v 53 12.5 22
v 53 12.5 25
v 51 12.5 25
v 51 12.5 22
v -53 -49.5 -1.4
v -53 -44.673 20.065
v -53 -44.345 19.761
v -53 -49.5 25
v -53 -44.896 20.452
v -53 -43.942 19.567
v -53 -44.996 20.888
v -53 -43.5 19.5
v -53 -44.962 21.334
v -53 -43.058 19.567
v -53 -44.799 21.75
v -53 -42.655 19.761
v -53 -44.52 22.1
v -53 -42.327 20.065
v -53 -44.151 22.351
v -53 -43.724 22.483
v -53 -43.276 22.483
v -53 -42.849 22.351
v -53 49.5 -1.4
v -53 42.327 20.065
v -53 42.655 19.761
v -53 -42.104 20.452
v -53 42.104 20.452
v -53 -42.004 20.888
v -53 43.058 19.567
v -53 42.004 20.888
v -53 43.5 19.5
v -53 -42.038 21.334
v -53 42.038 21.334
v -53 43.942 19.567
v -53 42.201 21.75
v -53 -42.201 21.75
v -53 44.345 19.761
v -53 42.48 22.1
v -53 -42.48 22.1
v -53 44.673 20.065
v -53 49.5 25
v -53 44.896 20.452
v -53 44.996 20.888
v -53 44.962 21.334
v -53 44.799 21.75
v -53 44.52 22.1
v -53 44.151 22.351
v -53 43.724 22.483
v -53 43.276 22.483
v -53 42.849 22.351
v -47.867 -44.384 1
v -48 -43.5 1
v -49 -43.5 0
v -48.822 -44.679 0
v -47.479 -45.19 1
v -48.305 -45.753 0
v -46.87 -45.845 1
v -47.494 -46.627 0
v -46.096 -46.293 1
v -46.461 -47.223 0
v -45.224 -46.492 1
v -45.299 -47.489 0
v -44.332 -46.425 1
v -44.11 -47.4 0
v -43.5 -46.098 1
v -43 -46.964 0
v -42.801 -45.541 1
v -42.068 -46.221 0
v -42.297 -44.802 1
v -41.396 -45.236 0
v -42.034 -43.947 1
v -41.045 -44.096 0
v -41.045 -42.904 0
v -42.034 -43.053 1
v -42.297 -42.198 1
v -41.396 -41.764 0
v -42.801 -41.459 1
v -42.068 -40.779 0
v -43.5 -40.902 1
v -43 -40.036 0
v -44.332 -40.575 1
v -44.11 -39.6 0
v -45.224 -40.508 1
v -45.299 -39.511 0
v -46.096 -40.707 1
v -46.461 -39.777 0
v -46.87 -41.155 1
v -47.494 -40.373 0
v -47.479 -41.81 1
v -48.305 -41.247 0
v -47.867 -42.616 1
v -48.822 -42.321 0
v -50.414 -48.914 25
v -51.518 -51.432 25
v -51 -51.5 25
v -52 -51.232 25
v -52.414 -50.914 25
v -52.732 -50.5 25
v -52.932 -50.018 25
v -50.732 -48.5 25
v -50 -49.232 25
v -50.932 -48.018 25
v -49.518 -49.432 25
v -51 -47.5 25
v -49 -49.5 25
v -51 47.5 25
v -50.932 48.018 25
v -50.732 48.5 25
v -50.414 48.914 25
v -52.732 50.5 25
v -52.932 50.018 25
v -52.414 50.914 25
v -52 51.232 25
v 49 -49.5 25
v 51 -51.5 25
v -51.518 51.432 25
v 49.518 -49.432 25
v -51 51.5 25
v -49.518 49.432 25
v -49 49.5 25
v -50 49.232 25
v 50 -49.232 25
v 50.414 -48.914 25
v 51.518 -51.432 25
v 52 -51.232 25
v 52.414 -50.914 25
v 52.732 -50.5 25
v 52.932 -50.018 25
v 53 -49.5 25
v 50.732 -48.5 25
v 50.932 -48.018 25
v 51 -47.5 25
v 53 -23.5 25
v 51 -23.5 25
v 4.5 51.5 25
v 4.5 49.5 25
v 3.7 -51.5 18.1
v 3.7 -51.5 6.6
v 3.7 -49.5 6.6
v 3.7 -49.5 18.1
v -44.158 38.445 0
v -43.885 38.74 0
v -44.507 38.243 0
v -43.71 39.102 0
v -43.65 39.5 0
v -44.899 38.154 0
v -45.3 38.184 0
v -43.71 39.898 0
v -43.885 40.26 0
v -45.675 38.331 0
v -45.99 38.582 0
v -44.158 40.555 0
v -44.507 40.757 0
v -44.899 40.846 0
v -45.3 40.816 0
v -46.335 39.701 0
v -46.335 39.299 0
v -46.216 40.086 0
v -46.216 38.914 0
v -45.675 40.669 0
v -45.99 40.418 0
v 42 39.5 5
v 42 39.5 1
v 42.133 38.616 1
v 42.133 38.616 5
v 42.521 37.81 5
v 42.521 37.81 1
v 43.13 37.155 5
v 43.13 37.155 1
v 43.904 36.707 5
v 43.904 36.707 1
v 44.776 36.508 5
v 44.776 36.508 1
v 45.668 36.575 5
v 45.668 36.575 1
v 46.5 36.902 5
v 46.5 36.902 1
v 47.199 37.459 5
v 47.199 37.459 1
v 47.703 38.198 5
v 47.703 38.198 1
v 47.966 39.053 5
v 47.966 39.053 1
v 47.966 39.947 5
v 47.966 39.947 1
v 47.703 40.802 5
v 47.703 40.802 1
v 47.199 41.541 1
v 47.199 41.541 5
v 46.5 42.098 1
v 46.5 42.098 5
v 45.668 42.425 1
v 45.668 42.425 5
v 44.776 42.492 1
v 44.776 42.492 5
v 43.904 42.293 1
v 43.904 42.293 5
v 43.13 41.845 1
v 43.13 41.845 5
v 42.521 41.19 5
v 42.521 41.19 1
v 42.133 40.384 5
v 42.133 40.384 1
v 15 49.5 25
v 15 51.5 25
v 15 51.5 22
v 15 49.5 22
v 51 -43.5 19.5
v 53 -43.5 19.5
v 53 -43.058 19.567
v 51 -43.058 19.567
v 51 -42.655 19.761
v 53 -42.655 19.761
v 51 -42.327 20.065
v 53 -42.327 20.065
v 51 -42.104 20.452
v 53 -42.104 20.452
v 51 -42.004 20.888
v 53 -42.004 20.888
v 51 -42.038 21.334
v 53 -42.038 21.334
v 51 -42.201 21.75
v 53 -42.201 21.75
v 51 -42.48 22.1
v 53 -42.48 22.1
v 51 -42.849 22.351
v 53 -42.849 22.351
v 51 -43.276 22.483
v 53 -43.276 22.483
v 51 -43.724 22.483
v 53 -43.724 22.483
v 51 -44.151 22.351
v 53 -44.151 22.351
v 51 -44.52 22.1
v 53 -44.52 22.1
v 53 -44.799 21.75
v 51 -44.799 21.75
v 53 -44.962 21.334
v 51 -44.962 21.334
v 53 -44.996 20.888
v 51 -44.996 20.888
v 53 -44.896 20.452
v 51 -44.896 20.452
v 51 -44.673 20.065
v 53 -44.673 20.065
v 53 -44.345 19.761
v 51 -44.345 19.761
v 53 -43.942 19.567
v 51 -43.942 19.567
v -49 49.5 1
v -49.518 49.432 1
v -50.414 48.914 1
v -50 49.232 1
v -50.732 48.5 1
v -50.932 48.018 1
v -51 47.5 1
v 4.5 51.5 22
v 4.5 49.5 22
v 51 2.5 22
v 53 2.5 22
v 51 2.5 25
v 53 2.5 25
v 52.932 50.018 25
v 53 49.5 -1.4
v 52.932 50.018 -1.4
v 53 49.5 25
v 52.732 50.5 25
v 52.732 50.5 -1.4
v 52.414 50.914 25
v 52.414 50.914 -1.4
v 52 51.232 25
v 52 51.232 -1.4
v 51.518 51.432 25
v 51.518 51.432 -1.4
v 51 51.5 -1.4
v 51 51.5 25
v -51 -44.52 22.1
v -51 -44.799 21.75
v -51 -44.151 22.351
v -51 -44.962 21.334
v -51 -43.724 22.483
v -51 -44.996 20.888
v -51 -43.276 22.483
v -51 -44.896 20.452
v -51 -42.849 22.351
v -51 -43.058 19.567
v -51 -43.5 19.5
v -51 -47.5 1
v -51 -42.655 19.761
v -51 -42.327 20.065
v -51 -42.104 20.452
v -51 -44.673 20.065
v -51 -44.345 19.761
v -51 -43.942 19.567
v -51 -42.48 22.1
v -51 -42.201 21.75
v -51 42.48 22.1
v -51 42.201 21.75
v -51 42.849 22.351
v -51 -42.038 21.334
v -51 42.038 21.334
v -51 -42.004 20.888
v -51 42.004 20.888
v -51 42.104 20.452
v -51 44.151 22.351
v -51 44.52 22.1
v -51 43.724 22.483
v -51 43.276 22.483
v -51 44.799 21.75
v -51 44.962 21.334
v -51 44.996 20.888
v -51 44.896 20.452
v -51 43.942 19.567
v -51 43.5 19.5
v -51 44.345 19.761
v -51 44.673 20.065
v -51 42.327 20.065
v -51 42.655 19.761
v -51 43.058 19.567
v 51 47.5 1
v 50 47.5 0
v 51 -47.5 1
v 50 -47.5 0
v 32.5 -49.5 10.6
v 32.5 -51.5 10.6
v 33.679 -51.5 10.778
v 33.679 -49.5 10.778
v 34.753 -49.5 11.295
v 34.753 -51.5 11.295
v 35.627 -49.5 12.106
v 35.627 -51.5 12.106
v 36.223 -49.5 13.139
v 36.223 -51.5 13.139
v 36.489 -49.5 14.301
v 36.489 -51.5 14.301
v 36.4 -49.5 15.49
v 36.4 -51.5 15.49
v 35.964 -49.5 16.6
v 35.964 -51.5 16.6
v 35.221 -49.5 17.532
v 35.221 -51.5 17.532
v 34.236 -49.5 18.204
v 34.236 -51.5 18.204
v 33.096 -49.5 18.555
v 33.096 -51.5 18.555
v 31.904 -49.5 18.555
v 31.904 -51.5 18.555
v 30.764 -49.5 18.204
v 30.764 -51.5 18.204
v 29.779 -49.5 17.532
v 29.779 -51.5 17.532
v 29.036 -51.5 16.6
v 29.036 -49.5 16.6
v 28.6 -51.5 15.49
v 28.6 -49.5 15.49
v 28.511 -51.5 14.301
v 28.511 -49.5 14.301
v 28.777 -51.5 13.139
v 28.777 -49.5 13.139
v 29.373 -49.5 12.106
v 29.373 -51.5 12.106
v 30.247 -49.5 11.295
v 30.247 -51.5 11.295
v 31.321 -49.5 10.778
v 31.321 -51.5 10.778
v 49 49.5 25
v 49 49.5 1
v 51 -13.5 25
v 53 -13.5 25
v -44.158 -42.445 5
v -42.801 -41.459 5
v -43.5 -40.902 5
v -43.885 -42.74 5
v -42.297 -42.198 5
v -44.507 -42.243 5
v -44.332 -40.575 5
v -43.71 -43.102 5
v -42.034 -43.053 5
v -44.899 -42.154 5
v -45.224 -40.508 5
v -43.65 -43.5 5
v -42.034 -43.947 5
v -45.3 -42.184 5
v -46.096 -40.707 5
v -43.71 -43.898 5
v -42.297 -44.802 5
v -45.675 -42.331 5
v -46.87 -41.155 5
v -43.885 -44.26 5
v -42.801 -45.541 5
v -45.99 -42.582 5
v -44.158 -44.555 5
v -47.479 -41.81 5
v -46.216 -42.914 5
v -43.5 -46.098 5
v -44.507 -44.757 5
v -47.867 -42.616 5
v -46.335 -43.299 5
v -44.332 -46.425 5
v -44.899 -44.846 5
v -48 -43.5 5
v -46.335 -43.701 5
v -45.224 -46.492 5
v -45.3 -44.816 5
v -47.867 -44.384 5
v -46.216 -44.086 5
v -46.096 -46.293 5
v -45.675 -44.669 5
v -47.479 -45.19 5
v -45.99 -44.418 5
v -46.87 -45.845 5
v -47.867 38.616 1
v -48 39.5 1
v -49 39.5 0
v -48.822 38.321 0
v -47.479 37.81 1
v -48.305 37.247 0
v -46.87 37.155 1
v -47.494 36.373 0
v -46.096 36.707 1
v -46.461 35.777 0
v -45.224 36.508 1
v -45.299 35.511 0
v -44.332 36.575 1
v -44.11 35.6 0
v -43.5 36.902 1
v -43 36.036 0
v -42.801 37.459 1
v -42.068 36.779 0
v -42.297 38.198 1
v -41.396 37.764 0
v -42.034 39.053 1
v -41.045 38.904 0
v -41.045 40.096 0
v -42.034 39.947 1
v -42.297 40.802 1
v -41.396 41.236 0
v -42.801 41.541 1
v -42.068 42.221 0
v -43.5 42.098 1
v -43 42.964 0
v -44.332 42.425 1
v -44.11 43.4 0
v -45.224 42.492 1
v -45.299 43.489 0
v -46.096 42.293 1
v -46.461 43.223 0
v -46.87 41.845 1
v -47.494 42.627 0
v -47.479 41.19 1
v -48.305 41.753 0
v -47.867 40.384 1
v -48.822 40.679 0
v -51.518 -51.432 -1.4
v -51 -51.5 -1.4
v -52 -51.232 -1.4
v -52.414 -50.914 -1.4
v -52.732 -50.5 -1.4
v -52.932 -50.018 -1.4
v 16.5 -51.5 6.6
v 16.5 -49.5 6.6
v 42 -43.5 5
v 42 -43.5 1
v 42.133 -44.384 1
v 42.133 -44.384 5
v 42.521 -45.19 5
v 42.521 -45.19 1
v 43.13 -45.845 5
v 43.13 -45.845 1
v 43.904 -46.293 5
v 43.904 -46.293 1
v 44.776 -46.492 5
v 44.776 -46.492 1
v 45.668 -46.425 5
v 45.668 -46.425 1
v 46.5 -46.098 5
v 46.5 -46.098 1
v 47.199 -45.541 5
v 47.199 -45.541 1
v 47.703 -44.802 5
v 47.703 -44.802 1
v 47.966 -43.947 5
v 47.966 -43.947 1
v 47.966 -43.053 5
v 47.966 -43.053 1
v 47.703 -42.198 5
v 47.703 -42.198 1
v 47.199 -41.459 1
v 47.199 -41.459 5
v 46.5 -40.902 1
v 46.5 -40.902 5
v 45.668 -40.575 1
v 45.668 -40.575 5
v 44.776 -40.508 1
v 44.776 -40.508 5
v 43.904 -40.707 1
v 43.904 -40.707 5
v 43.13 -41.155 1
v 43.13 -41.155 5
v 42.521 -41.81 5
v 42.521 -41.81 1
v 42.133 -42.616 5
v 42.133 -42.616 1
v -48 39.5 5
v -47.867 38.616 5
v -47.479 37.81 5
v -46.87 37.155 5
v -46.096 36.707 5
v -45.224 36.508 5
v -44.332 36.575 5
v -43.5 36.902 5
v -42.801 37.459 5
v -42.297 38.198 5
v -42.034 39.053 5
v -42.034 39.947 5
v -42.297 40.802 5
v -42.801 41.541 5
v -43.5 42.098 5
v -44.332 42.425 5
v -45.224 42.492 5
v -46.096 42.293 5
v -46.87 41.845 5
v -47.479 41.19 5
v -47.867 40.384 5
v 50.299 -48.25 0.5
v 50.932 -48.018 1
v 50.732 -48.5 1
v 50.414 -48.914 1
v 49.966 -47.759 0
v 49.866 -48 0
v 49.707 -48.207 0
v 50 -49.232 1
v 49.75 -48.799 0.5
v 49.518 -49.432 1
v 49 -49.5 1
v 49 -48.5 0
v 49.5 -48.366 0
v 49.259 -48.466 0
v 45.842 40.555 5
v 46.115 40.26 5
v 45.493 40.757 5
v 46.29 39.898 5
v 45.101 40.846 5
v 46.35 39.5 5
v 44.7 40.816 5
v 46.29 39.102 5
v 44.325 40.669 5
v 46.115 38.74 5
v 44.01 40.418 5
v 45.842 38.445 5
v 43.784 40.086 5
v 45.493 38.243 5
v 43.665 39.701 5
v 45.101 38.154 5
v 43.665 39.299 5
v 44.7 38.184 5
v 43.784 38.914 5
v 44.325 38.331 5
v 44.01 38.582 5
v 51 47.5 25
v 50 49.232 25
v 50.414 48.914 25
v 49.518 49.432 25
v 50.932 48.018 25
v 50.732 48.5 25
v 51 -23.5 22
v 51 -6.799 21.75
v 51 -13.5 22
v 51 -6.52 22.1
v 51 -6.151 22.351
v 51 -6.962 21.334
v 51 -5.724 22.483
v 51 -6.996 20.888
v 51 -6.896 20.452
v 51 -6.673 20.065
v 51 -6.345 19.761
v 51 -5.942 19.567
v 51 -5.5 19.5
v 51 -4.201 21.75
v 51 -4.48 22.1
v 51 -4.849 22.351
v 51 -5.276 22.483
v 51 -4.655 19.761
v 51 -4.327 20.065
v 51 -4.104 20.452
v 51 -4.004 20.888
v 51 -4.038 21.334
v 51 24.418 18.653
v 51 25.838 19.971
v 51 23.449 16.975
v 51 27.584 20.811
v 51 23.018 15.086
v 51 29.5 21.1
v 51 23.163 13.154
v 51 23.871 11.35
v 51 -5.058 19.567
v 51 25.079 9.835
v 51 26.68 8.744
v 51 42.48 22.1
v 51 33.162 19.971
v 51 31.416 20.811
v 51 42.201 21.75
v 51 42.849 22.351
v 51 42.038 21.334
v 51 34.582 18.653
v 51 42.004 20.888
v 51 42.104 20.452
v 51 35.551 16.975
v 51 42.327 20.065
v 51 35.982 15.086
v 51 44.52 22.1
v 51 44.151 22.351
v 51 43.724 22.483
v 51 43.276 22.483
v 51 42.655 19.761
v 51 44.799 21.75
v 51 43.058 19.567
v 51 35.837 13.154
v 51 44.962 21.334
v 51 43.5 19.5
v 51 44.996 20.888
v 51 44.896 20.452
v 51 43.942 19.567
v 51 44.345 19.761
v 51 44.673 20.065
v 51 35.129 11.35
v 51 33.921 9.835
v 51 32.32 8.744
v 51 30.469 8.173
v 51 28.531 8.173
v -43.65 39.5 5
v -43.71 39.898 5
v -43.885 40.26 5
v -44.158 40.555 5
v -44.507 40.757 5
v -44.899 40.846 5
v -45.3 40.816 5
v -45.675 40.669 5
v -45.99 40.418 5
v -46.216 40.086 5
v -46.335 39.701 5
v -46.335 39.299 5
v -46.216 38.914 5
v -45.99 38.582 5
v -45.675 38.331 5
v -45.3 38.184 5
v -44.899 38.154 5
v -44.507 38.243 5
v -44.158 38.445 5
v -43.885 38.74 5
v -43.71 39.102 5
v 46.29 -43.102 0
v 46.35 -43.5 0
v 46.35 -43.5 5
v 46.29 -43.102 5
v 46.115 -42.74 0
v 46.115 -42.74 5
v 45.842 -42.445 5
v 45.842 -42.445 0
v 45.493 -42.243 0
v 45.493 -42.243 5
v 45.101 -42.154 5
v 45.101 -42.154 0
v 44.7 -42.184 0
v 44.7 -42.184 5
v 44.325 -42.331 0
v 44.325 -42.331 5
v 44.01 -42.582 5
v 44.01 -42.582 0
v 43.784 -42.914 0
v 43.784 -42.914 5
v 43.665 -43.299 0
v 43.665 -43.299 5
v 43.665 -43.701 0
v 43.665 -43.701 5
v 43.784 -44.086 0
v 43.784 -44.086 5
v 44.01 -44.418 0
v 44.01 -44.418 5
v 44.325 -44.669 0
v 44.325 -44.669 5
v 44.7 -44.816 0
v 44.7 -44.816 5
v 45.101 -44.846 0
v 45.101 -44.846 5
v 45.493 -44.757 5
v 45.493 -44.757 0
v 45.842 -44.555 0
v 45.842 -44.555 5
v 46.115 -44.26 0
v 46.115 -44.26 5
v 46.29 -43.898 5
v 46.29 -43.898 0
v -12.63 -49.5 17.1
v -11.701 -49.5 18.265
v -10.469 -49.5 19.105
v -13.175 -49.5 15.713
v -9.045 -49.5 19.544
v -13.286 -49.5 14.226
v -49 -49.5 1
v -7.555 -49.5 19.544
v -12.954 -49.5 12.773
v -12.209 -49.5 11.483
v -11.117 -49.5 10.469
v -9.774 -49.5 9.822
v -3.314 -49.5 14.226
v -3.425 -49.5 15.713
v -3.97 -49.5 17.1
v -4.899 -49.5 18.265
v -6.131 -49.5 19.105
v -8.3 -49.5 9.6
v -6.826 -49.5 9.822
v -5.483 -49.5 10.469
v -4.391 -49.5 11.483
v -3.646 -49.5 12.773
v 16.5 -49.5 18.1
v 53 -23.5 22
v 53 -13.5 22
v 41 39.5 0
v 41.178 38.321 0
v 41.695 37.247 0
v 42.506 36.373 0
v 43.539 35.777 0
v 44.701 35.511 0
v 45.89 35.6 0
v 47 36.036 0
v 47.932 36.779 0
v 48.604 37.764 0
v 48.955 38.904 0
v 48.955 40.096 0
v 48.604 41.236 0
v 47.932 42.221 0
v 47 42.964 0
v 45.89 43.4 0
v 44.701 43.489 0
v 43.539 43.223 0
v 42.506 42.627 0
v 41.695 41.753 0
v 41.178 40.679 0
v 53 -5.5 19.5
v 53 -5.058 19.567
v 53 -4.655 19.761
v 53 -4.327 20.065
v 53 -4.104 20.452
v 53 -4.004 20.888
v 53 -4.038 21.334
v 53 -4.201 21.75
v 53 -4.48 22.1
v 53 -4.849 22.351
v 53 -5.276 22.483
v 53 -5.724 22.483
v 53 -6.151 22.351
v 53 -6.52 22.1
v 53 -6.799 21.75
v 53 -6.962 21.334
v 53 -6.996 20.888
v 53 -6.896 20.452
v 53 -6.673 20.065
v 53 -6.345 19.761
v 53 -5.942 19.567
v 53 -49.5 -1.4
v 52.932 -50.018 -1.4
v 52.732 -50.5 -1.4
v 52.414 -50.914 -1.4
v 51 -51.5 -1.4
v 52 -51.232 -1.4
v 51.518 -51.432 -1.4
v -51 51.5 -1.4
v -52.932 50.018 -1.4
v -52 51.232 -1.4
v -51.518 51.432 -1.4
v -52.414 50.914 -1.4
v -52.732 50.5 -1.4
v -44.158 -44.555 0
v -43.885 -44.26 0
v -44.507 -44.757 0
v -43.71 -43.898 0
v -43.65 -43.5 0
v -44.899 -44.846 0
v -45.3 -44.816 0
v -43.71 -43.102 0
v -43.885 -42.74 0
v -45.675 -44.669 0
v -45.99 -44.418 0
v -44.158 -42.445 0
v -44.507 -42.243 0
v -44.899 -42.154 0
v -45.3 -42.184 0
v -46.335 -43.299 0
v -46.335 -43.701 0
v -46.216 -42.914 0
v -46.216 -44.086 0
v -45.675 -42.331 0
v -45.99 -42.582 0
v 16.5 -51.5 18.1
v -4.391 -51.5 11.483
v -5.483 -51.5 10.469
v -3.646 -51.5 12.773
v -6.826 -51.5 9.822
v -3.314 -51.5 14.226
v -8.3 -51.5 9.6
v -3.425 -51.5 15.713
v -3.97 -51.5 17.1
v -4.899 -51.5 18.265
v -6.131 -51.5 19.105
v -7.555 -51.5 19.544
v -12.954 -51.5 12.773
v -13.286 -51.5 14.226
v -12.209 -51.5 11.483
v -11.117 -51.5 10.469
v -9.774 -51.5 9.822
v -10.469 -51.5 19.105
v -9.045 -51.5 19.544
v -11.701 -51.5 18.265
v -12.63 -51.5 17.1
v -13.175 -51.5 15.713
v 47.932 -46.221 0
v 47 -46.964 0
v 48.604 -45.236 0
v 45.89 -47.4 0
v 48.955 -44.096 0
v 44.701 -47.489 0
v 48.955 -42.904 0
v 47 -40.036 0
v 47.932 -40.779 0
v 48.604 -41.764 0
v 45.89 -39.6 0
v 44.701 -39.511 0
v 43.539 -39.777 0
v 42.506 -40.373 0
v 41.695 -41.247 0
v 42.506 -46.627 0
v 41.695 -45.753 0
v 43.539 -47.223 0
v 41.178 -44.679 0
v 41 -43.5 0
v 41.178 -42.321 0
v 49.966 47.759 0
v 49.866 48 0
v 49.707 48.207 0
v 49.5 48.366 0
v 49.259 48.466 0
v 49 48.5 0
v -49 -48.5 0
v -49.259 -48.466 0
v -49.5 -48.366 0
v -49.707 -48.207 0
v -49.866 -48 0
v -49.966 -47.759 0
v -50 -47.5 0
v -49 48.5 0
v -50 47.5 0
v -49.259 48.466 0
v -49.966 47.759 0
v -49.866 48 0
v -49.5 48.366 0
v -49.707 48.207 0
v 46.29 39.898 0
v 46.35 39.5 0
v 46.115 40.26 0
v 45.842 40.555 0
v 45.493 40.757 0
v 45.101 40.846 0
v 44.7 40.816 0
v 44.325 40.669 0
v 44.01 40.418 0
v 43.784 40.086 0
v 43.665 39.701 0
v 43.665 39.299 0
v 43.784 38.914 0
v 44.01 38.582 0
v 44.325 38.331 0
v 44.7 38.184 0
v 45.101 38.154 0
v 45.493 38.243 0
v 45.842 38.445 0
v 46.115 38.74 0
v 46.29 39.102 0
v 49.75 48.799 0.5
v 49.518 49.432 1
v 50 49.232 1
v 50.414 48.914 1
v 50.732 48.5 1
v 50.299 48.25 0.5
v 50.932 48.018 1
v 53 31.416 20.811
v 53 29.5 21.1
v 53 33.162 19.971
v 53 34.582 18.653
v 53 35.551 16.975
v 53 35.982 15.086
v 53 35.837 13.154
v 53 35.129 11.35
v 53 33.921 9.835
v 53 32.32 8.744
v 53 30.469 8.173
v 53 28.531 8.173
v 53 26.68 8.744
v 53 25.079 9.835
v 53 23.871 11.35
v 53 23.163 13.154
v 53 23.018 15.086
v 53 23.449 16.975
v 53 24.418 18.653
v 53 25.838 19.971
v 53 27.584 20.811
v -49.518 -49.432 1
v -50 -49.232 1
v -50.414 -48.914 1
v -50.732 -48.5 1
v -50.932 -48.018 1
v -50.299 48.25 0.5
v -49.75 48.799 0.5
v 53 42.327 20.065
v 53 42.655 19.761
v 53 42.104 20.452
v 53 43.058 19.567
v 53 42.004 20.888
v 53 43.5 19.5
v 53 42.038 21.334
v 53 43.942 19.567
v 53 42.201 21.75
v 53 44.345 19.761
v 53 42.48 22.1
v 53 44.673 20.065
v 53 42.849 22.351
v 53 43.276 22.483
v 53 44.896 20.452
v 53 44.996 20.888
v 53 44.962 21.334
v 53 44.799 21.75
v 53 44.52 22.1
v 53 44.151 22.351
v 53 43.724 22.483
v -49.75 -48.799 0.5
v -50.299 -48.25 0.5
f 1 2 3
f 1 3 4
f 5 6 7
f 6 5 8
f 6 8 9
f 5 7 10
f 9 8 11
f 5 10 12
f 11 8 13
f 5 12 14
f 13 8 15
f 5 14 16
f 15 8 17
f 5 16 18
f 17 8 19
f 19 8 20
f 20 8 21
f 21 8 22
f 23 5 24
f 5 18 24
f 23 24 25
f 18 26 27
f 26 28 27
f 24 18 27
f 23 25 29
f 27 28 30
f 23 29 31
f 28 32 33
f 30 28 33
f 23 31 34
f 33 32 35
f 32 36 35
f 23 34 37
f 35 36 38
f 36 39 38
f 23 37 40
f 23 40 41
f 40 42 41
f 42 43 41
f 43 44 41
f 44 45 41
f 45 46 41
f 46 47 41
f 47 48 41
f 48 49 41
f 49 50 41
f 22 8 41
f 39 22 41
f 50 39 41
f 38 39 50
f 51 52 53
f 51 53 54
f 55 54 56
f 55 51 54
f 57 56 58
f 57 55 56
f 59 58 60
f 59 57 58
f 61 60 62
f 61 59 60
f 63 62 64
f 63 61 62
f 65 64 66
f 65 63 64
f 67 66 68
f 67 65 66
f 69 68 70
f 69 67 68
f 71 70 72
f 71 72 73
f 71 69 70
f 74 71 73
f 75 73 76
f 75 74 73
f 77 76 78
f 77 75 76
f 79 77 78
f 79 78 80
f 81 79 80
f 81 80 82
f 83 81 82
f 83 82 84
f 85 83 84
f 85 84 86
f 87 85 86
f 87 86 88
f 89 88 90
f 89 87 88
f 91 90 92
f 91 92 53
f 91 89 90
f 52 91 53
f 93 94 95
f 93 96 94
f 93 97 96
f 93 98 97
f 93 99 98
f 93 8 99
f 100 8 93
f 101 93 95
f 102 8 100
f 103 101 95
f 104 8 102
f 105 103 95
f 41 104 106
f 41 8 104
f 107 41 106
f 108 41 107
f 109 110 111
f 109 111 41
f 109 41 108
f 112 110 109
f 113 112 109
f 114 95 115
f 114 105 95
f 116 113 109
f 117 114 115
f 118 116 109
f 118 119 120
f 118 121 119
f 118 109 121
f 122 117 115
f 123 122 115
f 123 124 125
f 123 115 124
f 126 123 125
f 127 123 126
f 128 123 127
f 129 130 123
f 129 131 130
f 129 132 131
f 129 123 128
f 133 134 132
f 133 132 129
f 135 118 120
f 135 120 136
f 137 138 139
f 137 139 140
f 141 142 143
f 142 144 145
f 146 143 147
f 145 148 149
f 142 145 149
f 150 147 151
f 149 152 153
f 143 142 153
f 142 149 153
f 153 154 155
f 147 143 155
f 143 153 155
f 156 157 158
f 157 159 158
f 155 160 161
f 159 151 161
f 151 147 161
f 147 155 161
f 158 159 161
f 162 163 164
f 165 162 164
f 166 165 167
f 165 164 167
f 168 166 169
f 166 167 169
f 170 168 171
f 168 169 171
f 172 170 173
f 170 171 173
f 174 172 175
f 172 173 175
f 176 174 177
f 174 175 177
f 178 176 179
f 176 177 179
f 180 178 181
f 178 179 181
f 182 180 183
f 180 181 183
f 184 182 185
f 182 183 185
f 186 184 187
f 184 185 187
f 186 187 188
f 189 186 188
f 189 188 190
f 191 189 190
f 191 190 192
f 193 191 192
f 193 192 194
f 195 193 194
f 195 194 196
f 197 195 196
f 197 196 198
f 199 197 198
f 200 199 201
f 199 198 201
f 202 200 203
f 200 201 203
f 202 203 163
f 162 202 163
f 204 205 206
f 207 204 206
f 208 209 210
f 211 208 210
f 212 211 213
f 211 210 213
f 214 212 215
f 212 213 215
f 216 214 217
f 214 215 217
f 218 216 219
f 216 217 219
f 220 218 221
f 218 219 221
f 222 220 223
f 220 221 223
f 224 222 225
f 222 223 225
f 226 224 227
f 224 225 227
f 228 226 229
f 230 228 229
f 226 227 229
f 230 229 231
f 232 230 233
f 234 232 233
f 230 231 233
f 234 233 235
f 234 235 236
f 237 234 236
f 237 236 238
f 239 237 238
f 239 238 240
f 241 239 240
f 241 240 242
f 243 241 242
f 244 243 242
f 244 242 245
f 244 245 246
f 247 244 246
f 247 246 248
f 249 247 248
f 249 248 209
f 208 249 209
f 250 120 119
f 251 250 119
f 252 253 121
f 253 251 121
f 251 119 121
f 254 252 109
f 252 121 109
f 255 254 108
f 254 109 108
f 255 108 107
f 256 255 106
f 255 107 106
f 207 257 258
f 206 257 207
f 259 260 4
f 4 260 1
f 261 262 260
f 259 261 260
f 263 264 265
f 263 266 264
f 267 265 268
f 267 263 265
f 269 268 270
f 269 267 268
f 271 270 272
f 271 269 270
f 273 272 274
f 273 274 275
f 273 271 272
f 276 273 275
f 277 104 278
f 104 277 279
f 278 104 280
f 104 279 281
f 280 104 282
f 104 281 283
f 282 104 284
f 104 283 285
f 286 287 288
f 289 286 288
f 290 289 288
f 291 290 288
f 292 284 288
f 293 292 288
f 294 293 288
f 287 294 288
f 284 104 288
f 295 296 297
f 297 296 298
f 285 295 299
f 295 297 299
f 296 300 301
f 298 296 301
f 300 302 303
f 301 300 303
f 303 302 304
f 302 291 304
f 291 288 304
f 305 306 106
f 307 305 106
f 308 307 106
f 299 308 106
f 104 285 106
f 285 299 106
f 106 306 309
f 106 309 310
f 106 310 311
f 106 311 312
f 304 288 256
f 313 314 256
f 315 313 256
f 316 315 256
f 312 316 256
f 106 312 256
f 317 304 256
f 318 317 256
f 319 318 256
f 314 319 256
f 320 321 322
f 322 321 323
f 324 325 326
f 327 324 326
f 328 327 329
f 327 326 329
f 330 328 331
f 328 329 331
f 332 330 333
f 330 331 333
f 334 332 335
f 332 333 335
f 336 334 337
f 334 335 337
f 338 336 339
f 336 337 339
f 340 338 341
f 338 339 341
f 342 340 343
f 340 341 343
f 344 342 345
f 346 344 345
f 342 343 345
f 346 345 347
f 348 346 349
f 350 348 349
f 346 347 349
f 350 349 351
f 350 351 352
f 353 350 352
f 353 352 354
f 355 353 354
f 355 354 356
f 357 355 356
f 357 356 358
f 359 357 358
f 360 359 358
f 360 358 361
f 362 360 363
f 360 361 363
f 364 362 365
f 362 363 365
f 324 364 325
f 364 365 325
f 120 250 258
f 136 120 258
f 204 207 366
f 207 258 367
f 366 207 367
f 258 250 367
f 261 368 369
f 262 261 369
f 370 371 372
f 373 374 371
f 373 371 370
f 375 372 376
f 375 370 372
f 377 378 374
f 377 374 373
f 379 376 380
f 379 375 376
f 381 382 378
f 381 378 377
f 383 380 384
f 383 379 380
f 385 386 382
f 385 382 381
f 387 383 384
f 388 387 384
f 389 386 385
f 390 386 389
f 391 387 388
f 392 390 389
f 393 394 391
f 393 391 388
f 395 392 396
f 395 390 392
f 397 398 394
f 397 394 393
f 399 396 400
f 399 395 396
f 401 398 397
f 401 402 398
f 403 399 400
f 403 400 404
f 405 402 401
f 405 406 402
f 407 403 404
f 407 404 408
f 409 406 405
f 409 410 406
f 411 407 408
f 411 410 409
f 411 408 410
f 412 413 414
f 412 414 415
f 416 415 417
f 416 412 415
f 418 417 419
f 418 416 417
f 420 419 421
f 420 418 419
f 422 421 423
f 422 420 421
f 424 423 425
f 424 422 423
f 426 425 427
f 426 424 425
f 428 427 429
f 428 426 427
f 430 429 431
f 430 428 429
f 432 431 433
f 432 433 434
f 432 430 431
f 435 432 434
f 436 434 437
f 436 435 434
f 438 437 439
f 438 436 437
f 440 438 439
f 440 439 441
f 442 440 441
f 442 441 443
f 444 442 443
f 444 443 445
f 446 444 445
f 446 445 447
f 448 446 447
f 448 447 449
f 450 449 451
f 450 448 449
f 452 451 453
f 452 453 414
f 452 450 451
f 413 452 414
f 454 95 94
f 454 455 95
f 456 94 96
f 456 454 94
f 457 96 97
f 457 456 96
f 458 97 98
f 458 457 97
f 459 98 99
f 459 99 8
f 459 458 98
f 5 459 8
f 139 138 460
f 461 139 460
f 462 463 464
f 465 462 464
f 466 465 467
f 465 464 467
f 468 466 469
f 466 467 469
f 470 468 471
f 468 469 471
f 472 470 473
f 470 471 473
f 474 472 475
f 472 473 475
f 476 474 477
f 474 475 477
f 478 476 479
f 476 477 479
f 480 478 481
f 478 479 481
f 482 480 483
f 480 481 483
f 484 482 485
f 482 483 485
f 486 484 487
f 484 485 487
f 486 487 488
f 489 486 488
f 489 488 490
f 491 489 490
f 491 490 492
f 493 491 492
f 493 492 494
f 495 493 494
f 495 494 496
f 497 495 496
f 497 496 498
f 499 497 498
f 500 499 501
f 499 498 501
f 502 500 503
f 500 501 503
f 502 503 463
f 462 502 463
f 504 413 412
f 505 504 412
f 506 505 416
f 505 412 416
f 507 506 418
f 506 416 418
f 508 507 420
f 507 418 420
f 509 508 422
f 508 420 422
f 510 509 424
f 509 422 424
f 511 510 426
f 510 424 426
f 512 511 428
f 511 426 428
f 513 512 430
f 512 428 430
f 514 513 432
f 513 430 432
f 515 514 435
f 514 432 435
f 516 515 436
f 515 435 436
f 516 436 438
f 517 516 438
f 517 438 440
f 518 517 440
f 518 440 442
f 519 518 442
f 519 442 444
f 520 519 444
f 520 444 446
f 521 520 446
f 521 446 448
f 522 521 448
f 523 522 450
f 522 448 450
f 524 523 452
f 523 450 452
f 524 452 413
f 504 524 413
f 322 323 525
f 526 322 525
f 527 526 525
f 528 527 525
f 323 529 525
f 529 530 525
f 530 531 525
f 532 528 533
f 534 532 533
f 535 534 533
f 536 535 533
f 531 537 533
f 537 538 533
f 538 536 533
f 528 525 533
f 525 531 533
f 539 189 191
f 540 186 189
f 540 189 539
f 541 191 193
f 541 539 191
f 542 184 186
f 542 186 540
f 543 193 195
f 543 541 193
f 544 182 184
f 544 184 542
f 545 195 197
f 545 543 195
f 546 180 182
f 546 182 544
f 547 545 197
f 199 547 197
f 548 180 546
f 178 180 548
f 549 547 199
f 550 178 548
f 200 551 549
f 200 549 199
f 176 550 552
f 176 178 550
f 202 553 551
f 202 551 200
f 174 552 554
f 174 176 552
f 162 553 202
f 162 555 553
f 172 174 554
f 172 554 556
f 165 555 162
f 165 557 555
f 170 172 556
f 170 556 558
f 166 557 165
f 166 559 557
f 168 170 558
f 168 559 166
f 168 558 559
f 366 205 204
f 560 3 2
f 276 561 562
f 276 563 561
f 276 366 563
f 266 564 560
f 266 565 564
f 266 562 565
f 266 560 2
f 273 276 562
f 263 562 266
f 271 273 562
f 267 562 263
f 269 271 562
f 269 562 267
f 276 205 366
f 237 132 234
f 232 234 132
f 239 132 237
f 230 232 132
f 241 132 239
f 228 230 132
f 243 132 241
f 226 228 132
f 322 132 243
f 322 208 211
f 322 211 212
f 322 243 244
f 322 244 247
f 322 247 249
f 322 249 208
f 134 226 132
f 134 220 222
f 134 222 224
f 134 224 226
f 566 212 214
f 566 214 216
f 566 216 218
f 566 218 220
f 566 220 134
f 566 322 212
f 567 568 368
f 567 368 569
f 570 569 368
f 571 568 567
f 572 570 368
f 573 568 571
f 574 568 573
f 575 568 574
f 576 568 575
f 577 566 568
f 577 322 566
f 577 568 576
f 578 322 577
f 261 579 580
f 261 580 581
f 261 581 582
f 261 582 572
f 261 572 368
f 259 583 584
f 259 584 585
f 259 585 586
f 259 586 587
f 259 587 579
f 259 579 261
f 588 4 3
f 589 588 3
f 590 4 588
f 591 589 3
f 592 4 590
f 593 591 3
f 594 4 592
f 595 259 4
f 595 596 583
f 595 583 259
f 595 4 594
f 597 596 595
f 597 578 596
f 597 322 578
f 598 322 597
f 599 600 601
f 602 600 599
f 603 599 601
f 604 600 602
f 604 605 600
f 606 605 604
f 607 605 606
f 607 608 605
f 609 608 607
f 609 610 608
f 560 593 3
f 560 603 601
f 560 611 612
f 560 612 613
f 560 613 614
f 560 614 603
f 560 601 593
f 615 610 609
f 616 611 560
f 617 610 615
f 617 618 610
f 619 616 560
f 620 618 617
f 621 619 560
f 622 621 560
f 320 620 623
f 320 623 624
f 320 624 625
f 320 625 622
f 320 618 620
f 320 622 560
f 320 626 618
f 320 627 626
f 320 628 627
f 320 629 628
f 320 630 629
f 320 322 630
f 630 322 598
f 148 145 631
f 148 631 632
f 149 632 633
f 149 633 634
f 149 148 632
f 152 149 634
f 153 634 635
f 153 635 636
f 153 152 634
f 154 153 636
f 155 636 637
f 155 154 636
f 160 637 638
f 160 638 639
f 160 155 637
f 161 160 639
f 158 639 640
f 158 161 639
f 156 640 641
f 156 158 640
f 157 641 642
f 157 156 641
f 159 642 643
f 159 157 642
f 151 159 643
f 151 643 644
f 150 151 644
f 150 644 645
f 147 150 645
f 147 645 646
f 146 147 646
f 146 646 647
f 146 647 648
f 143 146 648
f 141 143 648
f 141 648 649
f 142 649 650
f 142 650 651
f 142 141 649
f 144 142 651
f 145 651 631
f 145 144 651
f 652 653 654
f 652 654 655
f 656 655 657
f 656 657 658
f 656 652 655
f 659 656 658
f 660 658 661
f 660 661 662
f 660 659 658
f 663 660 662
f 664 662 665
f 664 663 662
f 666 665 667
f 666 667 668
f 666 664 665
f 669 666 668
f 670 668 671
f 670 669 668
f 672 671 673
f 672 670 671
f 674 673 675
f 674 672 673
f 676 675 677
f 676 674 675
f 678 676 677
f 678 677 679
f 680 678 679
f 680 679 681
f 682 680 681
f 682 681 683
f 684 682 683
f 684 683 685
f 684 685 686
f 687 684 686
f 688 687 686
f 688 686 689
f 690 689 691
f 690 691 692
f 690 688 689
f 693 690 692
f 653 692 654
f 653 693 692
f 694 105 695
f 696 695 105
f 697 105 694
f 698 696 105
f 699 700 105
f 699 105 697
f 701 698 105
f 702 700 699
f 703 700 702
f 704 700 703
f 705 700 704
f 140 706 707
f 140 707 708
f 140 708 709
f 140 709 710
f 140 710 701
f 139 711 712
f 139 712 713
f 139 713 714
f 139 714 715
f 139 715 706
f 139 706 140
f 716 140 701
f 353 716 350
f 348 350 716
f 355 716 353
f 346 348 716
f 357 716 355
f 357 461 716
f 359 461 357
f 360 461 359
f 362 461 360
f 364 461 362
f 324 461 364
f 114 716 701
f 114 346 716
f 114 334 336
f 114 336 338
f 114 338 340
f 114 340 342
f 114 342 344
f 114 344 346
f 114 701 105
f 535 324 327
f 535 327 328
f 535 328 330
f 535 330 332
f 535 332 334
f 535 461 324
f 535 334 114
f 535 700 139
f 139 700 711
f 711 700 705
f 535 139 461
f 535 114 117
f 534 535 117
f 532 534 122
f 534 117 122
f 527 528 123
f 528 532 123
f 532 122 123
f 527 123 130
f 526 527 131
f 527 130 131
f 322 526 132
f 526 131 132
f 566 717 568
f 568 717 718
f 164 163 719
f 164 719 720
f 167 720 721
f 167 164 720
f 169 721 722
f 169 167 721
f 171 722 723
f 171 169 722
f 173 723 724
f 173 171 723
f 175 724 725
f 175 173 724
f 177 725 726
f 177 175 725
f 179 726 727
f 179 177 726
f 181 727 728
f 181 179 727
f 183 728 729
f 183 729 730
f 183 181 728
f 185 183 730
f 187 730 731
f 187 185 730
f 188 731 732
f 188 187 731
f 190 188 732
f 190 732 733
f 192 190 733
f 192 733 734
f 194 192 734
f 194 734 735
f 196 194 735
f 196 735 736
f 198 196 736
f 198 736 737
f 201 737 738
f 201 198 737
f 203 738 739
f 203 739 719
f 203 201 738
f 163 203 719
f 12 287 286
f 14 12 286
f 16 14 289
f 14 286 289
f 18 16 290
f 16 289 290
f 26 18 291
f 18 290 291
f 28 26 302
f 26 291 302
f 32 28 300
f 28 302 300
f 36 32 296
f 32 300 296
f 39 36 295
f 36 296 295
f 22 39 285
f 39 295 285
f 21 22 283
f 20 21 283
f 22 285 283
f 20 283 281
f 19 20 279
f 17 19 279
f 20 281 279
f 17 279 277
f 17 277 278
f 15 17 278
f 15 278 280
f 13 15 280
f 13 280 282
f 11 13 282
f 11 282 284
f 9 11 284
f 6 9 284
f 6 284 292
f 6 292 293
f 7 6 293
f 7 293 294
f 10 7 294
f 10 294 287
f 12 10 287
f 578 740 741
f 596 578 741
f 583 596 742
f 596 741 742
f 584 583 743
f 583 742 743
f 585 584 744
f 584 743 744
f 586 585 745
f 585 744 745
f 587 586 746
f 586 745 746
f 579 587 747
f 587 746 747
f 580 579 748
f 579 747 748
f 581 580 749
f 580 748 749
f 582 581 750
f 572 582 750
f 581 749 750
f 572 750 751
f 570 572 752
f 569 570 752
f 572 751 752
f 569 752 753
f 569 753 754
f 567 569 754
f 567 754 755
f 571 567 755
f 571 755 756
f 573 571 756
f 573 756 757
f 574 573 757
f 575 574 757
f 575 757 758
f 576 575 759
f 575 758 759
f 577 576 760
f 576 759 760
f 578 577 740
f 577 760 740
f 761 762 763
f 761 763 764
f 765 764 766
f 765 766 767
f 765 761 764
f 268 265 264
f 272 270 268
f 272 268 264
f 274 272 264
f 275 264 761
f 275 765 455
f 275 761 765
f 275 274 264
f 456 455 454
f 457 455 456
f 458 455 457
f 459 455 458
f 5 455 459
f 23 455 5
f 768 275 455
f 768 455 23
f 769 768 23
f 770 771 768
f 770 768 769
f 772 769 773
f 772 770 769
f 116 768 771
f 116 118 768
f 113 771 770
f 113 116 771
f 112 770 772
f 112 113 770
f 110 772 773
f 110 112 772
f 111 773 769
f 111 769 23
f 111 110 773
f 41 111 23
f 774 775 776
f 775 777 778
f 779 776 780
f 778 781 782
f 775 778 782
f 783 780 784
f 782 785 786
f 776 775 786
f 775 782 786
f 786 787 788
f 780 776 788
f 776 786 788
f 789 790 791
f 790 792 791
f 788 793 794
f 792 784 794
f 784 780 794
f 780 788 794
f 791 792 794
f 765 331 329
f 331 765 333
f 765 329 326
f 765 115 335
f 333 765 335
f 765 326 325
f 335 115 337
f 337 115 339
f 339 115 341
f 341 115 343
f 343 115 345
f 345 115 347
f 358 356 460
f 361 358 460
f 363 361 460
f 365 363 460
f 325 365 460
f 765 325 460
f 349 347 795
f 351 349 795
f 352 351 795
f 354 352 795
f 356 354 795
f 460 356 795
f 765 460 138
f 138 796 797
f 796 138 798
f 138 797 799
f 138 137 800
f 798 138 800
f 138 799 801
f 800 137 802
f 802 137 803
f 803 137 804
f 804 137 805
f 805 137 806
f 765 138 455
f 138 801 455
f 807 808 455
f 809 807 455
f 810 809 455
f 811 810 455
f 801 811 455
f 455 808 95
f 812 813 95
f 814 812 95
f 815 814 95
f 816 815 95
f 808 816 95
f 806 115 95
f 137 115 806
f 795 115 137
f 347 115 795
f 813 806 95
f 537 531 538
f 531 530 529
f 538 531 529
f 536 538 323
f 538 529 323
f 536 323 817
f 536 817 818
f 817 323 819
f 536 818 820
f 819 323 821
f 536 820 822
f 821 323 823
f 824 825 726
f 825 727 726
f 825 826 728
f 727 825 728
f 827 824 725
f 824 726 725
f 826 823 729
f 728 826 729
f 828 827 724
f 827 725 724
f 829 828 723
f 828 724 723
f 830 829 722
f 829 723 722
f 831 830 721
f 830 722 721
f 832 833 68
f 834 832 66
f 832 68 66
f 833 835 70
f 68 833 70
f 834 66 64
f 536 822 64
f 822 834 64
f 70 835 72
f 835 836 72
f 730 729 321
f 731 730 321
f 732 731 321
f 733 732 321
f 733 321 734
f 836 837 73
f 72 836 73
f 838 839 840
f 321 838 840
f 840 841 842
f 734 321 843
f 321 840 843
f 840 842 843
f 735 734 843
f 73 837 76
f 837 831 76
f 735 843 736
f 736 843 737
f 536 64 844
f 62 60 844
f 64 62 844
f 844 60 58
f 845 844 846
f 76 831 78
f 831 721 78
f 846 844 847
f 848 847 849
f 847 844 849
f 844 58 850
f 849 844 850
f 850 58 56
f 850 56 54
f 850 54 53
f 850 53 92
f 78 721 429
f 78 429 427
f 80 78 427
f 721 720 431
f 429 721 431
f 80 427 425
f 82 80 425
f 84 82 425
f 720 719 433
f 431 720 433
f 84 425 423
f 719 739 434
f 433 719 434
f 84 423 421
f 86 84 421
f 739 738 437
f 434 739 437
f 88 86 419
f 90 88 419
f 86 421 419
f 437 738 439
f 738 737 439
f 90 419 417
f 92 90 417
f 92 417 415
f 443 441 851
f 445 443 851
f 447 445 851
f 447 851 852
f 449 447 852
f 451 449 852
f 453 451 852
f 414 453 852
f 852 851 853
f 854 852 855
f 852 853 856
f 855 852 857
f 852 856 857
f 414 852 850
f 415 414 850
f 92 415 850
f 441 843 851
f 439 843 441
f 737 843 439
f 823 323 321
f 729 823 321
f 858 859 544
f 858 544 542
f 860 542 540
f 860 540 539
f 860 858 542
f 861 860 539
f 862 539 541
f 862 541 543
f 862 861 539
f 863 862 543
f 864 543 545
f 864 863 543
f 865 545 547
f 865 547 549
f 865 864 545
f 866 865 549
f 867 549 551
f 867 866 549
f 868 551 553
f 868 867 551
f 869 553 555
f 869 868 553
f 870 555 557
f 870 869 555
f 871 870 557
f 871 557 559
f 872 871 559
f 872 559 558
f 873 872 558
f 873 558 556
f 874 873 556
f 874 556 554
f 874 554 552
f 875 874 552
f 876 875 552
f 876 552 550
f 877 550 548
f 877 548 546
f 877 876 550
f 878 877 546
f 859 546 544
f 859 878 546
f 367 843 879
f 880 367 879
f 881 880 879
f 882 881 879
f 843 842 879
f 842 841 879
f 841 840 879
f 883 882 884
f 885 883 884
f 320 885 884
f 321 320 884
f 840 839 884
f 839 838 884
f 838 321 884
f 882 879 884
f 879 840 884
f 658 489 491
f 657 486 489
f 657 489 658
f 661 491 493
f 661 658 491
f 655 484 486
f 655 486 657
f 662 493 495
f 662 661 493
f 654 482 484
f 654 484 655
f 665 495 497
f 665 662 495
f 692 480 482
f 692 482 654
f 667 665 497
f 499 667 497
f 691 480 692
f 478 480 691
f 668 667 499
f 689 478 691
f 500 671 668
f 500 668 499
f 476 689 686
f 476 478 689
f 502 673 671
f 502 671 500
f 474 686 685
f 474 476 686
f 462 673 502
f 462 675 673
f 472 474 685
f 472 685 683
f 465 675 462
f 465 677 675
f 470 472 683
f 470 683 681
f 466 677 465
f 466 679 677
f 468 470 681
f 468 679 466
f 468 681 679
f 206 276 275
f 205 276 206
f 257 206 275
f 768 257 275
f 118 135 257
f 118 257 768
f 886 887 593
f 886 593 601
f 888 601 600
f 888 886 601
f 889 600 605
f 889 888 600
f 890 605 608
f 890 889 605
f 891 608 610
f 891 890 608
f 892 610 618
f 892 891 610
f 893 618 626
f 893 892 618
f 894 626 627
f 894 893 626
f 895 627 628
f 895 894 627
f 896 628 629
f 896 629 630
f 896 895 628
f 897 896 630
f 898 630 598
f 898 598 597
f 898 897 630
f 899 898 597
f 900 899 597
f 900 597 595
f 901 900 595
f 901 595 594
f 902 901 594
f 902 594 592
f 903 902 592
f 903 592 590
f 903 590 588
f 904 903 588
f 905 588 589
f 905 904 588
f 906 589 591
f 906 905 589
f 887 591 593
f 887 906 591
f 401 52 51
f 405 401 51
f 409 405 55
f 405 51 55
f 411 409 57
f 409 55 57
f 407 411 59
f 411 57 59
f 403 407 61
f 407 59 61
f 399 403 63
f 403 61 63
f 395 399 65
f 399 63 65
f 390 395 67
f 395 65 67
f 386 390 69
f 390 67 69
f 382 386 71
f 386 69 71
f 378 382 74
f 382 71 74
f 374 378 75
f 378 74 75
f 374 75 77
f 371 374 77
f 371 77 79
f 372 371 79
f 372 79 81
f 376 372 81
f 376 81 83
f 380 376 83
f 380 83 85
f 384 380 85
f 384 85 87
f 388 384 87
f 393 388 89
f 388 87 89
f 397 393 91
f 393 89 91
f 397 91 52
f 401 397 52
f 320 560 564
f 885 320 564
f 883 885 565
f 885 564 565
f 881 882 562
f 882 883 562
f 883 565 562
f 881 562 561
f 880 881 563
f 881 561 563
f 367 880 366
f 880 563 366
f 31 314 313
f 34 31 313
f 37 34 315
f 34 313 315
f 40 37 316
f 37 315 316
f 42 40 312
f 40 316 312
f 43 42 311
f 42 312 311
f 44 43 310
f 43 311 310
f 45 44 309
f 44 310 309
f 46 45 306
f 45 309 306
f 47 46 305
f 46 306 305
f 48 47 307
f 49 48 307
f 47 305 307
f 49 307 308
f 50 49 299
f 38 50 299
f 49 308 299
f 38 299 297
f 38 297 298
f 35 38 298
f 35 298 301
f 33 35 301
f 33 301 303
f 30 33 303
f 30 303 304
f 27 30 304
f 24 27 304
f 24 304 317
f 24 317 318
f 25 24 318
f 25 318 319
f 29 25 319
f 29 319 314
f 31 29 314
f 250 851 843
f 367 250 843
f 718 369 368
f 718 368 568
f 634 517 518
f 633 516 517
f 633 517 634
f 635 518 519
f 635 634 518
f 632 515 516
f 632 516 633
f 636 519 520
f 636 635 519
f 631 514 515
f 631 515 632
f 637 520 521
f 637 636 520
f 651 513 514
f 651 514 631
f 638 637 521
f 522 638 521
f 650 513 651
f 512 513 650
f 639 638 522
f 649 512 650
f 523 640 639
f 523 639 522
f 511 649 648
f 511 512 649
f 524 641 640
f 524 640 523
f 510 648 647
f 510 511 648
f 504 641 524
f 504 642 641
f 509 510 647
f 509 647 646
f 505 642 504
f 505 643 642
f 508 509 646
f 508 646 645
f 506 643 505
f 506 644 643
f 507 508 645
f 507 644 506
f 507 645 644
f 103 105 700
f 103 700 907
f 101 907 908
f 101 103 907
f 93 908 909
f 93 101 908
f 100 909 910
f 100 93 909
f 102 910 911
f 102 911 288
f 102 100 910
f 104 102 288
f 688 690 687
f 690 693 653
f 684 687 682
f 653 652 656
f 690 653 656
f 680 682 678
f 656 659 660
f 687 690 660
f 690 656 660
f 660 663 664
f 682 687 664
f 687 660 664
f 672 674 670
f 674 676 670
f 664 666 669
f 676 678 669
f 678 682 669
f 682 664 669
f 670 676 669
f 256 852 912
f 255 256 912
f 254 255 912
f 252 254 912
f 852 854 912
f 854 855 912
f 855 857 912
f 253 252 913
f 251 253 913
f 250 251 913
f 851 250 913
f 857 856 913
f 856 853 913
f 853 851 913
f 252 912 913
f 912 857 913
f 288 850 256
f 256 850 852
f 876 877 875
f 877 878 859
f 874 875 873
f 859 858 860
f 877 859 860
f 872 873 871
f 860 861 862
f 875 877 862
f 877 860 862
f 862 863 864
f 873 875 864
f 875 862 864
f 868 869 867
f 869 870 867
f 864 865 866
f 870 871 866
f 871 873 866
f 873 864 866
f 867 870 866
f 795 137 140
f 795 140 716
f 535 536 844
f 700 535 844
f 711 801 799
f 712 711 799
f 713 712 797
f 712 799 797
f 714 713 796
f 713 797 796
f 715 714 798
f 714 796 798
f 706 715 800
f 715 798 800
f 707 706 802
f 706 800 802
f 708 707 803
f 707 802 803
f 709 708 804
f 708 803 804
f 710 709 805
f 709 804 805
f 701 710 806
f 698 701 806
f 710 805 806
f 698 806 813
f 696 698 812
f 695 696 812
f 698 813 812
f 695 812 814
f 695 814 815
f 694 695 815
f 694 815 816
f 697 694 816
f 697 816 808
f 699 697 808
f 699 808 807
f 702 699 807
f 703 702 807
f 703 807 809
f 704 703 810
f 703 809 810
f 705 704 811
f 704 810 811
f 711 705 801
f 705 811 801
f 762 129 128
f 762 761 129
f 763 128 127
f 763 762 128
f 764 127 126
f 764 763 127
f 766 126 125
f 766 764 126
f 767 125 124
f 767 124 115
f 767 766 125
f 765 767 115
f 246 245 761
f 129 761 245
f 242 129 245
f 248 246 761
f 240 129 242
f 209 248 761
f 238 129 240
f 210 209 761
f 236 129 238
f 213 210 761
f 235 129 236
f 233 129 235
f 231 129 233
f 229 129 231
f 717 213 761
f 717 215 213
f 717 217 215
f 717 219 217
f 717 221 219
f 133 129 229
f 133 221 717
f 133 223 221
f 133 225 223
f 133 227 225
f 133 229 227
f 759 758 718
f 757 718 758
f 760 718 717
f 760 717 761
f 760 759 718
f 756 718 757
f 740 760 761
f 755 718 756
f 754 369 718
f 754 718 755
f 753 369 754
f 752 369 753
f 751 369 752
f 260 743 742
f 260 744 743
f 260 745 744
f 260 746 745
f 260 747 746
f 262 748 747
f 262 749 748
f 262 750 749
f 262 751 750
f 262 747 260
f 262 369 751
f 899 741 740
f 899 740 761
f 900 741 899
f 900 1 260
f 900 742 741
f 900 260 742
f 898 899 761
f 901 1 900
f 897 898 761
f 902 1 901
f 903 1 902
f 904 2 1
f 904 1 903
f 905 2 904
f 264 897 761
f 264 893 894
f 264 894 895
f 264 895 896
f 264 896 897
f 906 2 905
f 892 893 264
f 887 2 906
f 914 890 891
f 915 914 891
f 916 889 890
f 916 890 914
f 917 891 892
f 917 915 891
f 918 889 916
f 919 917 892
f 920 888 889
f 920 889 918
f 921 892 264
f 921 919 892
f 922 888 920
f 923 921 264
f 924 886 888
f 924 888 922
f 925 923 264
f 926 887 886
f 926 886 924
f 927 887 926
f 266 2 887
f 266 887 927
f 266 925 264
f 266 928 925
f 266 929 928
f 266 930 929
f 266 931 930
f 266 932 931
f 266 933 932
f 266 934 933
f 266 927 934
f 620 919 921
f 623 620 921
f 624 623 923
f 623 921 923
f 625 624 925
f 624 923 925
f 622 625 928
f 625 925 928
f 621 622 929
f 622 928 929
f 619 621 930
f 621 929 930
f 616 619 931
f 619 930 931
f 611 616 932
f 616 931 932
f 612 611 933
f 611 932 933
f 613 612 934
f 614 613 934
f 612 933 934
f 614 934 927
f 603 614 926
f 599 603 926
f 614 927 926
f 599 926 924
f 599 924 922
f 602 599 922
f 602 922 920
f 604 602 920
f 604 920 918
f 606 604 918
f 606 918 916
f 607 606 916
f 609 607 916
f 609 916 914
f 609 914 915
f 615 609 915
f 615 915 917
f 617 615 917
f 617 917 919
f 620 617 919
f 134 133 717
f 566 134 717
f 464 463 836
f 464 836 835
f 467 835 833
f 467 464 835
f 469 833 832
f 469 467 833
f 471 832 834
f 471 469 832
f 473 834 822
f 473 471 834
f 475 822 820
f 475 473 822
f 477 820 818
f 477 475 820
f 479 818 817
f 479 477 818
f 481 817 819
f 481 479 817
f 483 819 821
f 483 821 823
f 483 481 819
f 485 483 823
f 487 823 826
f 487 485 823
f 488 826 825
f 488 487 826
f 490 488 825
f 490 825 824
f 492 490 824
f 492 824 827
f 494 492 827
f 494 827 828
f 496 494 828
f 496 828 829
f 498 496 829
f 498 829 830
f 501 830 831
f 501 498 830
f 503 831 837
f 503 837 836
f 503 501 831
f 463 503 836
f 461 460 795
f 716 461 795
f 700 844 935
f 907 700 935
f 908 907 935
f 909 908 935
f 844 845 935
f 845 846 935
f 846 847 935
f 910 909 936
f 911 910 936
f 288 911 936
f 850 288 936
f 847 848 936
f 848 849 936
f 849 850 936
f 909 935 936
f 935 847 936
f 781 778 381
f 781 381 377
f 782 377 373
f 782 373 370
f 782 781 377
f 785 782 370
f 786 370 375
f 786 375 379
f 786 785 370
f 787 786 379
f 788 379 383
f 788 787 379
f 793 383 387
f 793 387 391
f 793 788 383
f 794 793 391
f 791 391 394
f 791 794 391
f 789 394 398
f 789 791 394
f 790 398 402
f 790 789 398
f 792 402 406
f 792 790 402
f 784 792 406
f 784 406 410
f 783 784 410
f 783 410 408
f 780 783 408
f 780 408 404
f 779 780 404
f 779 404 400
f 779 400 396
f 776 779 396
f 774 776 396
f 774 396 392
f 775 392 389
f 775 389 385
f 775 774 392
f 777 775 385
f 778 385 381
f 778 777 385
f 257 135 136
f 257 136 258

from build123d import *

# Parameters (mm, degrees)
SKETCH_1_W          = 106
SKETCH_1_H          = 103
SKETCH_1_W_2        = 102
SKETCH_1_H_2        = 99
EXTRUDE_1_DEPTH     = 25
SKETCH_2_W          = 106
SKETCH_2_H          = 103
EXTRUDE_2_DEPTH     = 1.4
SKETCH_3_R          = 3
SKETCH_3_R_2        = 1.35
EXTRUDE_3_DEPTH     = 5
SKETCH_4_W          = 12.8
SKETCH_4_H          = 11.5
CUT_EXTRUDE_1_DEPTH = 101
FILLET_1_R          = 2
CHAMFER_1_SIZE      = 1
SKETCH_5_R          = 4
SKETCH_5_R_2        = 5
CUT_EXTRUDE_2_DEPTH = 2
SKETCH_6_W          = 3
SKETCH_6_H          = 10
CUT_EXTRUDE_3_DEPTH = 2
SKETCH_8_R          = 1.5
CUT_EXTRUDE_4_DEPTH = 121.470950855
SKETCH_9_R          = 1.5
CUT_EXTRUDE_5_DEPTH = 2
SKETCH_10_W         = 10.5
SKETCH_10_H         = 3
CUT_EXTRUDE_6_DEPTH = 2
SKETCH_11_R         = 6.5
CUT_EXTRUDE_7_DEPTH = 2


with BuildPart() as part:
    # Эскиз1 → Бобышка-Вытянуть1 (new body)
    with BuildSketch(Plane.XY):
        Rectangle(SKETCH_1_W, SKETCH_1_H)
        Rectangle(SKETCH_1_W_2, SKETCH_1_H_2, mode=Mode.SUBTRACT)
    extrude(amount=EXTRUDE_1_DEPTH)

    # Эскиз2 → Бобышка-Вытянуть2 (add)
    with BuildSketch(Plane(origin=(0, 0, 0), x_dir=(-1, 0, 0), z_dir=(0, 0, -1))):
        Rectangle(SKETCH_2_W, SKETCH_2_H)
    extrude(amount=EXTRUDE_2_DEPTH)

    # Эскиз3 → Бобышка-Вытянуть3 (add)
    # profile 1 of 4: a face of its own
    with BuildSketch(Plane.XY):
        with Locations(Location((-45, 39.5, 0), (0, 0, 180))):
            Circle(SKETCH_3_R)
        with Locations((-45, 39.5)):
            Circle(SKETCH_3_R_2, mode=Mode.SUBTRACT)
    # profile 2 of 4: a face of its own
    with BuildSketch(Plane.XY):
        with Locations(Location((45, 39.5, 0), (0, 0, 180))):
            Circle(SKETCH_3_R)
        with Locations((45, 39.5)):
            Circle(SKETCH_3_R_2, mode=Mode.SUBTRACT)
    # profile 3 of 4: a face of its own
    with BuildSketch(Plane.XY):
        with Locations(Location((-45, -43.5, 0), (0, 0, 180))):
            Circle(SKETCH_3_R)
        with Locations((-45, -43.5)):
            Circle(SKETCH_3_R_2, mode=Mode.SUBTRACT)
    # profile 4 of 4: a face of its own
    with BuildSketch(Plane.XY):
        with Locations(Location((45, -43.5, 0), (0, 0, 180))):
            Circle(SKETCH_3_R)
        with Locations((45, -43.5)):
            Circle(SKETCH_3_R_2, mode=Mode.SUBTRACT)
    extrude(amount=EXTRUDE_3_DEPTH)

    # Эскиз4 → Вырез-Вытянуть1 (cut)
    with BuildSketch(Plane.XZ.offset(51.5)):
        with Locations((10.1, 12.35)):
            Rectangle(SKETCH_4_W, SKETCH_4_H)
    extrude(amount=-CUT_EXTRUDE_1_DEPTH, mode=Mode.SUBTRACT)

    # Скругление1
    fillet_1_edges = [part.edges().sort_by_distance(p)[0] for p in [
        (51, -49.5, 12.5),
        (51, 49.5, 12.5),
        (-51, 49.5, 12.5),
        (-51, -49.5, 12.5),
        (53, -51.5, 11.8),
        (-53, -51.5, 11.8),
        (-53, 51.5, 11.8),
        (53, 51.5, 11.8),
    ]]
    fillet(fillet_1_edges, radius=FILLET_1_R)

    # Фаска1
    chamfer_1_edges = [part.edges().sort_by_distance(p)[0] for p in [
        (-51, 0, 0),
        (0, -49.5, 0),
        (51, 0, 0),
        (0, 49.5, 0),
        (50.414213562, -48.914213562, 0),
        (50.414213562, 48.914213562, 0),
        (-50.414213562, 48.914213562, 0),
        (-50.414213562, -48.914213562, 0),
        (-42, 39.5, 0),
        (48, 39.5, 0),
        (-42, -43.5, 0),
        (48, -43.5, 0),
    ]]
    chamfer(chamfer_1_edges, length=CHAMFER_1_SIZE)

    # Эскиз5 → Вырез-Вытянуть2 (cut)
    with BuildSketch(Plane.XZ.offset(51.5)):
        with Locations(Location((32.5, 14.6, 0), (0, 0, 270))):
            Circle(SKETCH_5_R)
        with Locations(Location((-8.3, 14.6, 0), (0, 0, 270))):
            Circle(SKETCH_5_R_2)
    extrude(amount=-CUT_EXTRUDE_2_DEPTH, mode=Mode.SUBTRACT)

    # Эскиз6 → Вырез-Вытянуть3 (cut)
    with BuildSketch(Plane(origin=(53, 0, 0), x_dir=(0, 0, -1), z_dir=(1, 0, 0))):
        with Locations((-23.5, -18.5)):
            Rectangle(SKETCH_6_W, SKETCH_6_H)
        with Locations((-23.5, 7.5)):
            Rectangle(SKETCH_6_W, SKETCH_6_H)
    extrude(amount=-CUT_EXTRUDE_3_DEPTH, mode=Mode.SUBTRACT)

    # Эскиз8 → Вырез-Вытянуть4 (cut, through all)
    with BuildSketch(Plane(origin=(53, 0, 0), x_dir=(0, 0, -1), z_dir=(1, 0, 0))):
        with Locations((-21, 43.5)):
            Circle(SKETCH_8_R)
        with Locations((-21, -43.5)):
            Circle(SKETCH_8_R)
    extrude(amount=-CUT_EXTRUDE_4_DEPTH, mode=Mode.SUBTRACT)

    # Эскиз9 → Вырез-Вытянуть5 (cut)
    with BuildSketch(Plane(origin=(53, 0, 0), x_dir=(0, 0, -1), z_dir=(1, 0, 0))):
        with Locations((-21, -5.5)):
            Circle(SKETCH_9_R)
    extrude(amount=-CUT_EXTRUDE_5_DEPTH, mode=Mode.SUBTRACT)

    # Эскиз10 → Вырез-Вытянуть6 (cut)
    with BuildSketch(Plane(origin=(0, 51.5, 0), x_dir=(1, 0, 0), z_dir=(0, 1, 0))):
        with Locations((9.75, -23.5)):
            Rectangle(SKETCH_10_W, SKETCH_10_H)
    extrude(amount=-CUT_EXTRUDE_6_DEPTH, mode=Mode.SUBTRACT)

    # Эскиз11 → Вырез-Вытянуть7 (cut)
    with BuildSketch(Plane(origin=(53, -1.5, 0), x_dir=(0, 1, 0), z_dir=(-1, 0, 0))):
        with Locations(Location((31, -14.6, 0), (0, 0, 270))):
            Circle(SKETCH_11_R)
    extrude(amount=CUT_EXTRUDE_7_DEPTH, mode=Mode.SUBTRACT)


solid = part.part
